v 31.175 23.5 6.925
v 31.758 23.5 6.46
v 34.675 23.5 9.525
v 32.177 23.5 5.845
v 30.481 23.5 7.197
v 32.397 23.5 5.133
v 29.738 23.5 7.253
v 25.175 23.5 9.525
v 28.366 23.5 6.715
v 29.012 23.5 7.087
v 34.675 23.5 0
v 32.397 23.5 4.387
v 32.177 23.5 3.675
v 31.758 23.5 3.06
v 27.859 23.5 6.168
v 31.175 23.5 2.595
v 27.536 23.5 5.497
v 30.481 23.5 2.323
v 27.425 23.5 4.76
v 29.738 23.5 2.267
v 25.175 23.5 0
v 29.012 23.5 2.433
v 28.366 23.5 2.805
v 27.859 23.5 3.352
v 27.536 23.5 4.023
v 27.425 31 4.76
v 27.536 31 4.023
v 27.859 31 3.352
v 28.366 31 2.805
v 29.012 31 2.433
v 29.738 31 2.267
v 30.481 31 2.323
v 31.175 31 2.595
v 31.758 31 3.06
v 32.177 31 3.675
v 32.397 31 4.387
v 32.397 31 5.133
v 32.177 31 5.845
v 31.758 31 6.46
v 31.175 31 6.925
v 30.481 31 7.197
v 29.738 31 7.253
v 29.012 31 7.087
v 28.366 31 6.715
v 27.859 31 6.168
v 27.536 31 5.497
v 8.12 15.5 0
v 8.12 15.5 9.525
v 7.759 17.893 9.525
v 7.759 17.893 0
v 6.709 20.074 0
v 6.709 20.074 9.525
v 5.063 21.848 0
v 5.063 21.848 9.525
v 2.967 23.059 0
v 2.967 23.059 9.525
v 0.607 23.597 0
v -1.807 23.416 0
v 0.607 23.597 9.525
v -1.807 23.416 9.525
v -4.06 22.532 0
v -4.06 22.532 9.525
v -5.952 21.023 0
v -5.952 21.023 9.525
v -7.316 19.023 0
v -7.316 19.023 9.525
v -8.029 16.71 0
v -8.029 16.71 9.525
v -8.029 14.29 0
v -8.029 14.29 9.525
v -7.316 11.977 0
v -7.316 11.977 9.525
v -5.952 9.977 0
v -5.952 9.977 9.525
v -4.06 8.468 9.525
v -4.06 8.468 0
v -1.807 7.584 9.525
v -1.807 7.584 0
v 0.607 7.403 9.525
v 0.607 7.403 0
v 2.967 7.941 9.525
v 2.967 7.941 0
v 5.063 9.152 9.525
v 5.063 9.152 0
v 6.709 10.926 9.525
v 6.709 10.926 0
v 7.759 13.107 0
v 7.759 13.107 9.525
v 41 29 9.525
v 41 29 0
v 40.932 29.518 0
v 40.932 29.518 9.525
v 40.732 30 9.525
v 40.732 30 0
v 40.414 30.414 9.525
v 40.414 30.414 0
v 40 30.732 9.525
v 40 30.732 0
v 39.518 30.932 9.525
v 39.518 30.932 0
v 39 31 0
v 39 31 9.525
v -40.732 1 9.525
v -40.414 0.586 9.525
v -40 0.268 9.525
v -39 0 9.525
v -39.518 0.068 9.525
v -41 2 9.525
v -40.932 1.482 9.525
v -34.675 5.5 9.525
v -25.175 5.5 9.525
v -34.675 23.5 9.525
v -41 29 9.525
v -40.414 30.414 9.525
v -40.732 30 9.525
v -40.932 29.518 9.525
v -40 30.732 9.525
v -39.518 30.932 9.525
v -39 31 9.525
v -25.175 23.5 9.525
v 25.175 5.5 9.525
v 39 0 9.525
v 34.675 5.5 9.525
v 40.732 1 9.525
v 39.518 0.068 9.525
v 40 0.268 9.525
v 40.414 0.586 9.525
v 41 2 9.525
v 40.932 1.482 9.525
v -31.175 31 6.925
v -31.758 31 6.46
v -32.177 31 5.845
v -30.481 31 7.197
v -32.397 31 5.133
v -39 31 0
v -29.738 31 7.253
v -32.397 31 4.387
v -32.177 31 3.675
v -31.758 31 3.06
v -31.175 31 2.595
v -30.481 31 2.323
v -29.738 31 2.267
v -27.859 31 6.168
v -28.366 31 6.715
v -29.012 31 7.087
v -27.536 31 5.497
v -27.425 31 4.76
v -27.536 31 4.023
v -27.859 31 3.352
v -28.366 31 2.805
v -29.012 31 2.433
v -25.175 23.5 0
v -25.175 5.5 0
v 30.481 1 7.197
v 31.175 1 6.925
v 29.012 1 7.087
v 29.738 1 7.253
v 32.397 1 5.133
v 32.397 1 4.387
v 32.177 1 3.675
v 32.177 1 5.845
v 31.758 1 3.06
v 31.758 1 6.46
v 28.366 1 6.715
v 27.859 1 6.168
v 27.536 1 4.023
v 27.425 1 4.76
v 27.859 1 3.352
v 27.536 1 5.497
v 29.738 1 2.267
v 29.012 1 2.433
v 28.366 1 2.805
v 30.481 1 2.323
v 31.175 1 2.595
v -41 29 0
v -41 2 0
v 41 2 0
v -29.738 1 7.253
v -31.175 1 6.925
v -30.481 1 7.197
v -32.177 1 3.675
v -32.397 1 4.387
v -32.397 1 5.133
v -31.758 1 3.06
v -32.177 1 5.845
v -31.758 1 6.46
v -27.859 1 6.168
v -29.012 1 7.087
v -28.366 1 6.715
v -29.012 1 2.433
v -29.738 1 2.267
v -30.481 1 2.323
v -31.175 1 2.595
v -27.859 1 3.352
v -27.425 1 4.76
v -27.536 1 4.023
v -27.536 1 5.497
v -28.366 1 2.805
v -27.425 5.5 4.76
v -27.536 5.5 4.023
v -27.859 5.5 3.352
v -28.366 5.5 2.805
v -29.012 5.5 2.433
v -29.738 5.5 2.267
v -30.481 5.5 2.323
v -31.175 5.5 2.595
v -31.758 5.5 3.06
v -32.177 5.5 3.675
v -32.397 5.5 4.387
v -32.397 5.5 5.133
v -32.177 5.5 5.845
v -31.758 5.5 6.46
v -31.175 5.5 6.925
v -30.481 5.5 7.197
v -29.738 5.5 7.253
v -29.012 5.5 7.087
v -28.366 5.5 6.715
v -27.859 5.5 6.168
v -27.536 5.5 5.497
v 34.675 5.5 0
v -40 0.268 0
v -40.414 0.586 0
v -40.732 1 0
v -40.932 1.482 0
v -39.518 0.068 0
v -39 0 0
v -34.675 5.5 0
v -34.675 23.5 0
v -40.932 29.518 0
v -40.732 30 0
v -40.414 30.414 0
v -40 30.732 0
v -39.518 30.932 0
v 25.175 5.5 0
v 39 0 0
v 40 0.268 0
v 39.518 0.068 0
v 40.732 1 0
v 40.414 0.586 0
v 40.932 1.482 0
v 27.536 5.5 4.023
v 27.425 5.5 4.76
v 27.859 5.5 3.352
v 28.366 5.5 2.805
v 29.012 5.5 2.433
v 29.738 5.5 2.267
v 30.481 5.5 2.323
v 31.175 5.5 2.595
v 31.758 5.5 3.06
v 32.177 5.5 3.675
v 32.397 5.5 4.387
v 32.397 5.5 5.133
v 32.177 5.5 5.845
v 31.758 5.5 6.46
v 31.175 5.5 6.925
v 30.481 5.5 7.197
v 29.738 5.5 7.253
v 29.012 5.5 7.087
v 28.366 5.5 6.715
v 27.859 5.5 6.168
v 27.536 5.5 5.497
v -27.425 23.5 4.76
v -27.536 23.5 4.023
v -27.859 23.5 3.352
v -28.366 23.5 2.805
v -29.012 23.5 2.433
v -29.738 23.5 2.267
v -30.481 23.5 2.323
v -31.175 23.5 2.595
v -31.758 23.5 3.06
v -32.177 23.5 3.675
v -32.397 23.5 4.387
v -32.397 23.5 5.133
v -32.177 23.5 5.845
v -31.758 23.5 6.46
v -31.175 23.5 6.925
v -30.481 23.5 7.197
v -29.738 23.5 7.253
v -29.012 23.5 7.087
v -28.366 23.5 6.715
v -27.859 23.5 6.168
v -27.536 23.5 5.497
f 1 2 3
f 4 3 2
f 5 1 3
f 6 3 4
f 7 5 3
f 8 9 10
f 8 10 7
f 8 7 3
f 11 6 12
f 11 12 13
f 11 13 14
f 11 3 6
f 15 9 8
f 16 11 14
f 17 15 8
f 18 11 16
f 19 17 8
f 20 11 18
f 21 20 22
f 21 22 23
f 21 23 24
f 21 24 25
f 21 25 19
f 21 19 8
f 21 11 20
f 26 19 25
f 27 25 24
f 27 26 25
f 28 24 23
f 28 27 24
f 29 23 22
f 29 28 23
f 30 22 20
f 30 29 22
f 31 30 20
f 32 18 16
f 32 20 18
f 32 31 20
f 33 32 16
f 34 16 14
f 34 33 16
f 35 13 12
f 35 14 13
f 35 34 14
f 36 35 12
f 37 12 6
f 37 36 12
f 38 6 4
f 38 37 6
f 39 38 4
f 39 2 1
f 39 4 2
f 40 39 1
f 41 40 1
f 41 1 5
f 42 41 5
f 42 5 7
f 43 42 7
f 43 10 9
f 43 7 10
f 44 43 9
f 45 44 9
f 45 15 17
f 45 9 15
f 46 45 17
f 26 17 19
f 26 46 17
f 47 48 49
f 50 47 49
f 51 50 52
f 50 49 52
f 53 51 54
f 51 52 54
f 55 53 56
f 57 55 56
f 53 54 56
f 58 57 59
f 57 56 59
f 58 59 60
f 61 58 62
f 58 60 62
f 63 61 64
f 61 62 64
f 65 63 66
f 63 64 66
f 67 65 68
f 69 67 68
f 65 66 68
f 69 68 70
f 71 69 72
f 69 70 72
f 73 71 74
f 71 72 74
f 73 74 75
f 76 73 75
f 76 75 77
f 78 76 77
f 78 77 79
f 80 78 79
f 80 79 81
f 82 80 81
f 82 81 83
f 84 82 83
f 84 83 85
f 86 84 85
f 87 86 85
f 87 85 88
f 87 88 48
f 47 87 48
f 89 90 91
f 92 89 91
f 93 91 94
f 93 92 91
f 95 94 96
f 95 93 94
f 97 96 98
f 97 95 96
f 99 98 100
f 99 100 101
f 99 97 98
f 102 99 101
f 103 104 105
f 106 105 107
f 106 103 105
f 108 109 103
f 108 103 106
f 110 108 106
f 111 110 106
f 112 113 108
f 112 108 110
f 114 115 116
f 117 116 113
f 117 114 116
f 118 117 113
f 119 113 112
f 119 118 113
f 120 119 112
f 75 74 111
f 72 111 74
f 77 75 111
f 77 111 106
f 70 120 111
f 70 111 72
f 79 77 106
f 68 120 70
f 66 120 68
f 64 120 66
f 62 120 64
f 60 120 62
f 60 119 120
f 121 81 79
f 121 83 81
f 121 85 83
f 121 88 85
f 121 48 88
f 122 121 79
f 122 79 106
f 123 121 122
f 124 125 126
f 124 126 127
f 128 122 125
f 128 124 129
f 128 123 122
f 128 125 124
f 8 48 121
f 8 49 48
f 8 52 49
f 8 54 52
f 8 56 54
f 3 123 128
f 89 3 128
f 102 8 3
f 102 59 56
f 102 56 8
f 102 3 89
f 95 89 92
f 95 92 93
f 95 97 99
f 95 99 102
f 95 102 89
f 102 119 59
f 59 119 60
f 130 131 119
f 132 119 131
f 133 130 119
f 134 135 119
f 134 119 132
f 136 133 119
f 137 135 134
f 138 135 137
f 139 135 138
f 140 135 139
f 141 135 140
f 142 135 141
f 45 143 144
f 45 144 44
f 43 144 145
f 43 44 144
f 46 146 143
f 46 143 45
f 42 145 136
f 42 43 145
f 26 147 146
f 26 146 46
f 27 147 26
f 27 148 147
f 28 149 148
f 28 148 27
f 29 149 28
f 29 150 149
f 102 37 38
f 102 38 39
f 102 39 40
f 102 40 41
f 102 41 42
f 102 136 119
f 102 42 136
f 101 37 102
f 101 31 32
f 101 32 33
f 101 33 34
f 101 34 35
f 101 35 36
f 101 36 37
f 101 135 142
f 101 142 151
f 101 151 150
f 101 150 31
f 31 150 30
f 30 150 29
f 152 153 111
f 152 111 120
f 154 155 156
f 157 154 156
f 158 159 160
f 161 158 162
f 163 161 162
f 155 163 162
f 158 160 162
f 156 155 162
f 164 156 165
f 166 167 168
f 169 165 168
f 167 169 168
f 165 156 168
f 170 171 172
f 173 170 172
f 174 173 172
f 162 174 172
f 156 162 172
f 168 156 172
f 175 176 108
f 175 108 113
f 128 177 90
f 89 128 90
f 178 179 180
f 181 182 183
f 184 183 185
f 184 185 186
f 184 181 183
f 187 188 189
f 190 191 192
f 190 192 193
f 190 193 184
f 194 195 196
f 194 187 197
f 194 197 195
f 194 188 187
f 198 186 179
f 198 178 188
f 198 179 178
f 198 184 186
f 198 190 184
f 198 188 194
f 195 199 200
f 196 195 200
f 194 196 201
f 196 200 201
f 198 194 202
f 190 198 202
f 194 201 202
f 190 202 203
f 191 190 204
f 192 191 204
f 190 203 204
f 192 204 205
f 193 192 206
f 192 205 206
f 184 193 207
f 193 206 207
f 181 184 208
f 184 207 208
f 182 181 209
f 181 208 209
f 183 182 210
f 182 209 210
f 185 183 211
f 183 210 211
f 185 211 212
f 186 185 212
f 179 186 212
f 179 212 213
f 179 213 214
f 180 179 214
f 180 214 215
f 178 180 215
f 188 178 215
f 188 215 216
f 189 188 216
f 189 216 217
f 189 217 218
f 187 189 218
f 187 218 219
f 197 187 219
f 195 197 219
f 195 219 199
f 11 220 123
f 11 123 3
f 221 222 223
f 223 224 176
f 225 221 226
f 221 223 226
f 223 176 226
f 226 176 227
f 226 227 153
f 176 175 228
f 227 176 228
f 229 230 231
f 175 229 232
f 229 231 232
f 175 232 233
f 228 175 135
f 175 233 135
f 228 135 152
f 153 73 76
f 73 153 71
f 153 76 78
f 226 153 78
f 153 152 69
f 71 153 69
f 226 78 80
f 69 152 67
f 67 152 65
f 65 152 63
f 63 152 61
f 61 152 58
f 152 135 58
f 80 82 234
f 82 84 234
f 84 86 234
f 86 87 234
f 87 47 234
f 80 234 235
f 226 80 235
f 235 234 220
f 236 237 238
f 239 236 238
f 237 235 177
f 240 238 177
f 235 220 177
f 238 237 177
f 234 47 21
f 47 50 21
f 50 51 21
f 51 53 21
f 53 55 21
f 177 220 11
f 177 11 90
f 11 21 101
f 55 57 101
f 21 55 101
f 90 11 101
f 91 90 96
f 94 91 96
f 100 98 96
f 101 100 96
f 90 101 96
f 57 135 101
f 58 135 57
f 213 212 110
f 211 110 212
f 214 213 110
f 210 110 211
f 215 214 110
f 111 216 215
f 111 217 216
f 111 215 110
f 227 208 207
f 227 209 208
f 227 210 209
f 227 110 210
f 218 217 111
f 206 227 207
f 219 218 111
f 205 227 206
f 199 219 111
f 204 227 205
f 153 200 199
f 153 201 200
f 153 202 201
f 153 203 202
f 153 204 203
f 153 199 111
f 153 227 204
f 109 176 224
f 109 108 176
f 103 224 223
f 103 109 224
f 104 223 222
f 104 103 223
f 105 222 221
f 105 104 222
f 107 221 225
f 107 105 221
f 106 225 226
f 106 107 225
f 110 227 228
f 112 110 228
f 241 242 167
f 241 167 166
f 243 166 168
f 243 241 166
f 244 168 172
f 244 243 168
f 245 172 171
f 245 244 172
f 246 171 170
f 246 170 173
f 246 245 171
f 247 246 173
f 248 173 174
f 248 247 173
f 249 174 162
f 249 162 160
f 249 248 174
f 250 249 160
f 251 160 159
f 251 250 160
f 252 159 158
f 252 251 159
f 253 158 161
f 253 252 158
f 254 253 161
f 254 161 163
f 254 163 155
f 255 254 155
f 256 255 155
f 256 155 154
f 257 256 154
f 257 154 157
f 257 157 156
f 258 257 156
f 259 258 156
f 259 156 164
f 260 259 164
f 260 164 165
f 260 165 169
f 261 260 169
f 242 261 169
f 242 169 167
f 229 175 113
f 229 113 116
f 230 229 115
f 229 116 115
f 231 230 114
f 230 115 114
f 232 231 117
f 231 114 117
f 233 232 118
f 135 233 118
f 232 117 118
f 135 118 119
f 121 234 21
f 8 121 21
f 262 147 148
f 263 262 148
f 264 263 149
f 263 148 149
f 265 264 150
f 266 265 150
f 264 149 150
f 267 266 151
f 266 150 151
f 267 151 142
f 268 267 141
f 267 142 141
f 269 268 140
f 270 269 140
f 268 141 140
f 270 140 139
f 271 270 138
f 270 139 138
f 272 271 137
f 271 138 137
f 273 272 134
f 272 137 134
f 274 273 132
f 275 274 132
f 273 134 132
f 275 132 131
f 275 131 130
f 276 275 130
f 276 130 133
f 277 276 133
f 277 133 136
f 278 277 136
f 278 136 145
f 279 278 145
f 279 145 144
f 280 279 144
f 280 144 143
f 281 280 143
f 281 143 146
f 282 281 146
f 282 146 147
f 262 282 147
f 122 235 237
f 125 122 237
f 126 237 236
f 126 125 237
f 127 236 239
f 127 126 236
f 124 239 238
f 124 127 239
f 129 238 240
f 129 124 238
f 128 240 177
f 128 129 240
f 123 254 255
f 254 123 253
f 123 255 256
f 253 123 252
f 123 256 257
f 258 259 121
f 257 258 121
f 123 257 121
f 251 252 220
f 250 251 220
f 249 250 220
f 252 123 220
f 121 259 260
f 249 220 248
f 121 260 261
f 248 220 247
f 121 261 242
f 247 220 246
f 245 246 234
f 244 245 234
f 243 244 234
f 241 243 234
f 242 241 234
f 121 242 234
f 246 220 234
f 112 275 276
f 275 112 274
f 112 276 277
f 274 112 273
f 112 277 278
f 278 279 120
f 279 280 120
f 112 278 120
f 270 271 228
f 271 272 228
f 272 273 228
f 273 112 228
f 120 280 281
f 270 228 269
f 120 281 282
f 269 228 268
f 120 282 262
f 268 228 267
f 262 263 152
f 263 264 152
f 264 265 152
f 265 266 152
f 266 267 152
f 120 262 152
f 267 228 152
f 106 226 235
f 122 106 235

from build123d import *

# Parameters (mm, degrees)
SKETCH1_W           = 82
SKETCH1_H           = 31
BOSS_EXTRUDE2_DEPTH = 9.525
FILLET2_R           = 2
SKETCH2_R           = 8.119849814
CUT_EXTRUDE1_DEPTH  = 10.525
SKETCH3_W           = 9.5
SKETCH3_H           = 18
CUT_EXTRUDE2_DEPTH  = 10.525
SKETCH5_R           = 2.5
CUT_EXTRUDE4_DEPTH  = 30


with BuildPart() as part:
    # Sketch1 → Boss-Extrude2 (new body)
    with BuildSketch(Plane.XY):
        with Locations((0, 15.5)):
            Rectangle(SKETCH1_W, SKETCH1_H)
    extrude(amount=BOSS_EXTRUDE2_DEPTH)

    # Fillet2
    fillet2_edges = [part.edges().sort_by_distance(p)[0] for p in [
        (-41, 31, 4.7625),
        (41, 31, 4.7625),
        (41, 0, 4.7625),
        (-41, 0, 4.7625),
    ]]
    fillet(fillet2_edges, radius=FILLET2_R)

    # Sketch2 → Cut-Extrude1 (cut, through all)
    with BuildSketch(Plane.XY.offset(9.525)):
        with Locations((0, 15.5)):
            Circle(SKETCH2_R)
    extrude(amount=-CUT_EXTRUDE1_DEPTH, mode=Mode.SUBTRACT)

    # Sketch3 → Cut-Extrude2 (cut, through all)
    with BuildSketch(Plane(origin=(0, 0, 0), x_dir=(-1, 0, 0), z_dir=(0, 0, -1))):
        with Locations((-29.925, 14.5)):
            Rectangle(SKETCH3_W, SKETCH3_H)
    cut_extrude2 = extrude(amount=-CUT_EXTRUDE2_DEPTH, mode=Mode.SUBTRACT)

    # Sketch5 → Cut-Extrude4 (cut)
    with BuildSketch(Plane(origin=(0, 31, 0), x_dir=(1, 0, 0), z_dir=(0, 1, 0))):
        with Locations((-29.925, -4.76)):
            Circle(SKETCH5_R)
    cut_extrude4 = extrude(amount=-CUT_EXTRUDE4_DEPTH, mode=Mode.SUBTRACT)

    # Mirror1: Cut-Extrude2, Cut-Extrude4 across plane
    add(cut_extrude2.mirror(Plane(origin=(0, 0, 0), x_dir=(0, 0, 1), z_dir=(1, 0, 0))), mode=Mode.SUBTRACT)
    add(cut_extrude4.mirror(Plane(origin=(0, 0, 0), x_dir=(0, 0, 1), z_dir=(1, 0, 0))), mode=Mode.SUBTRACT)


solid = part.part
